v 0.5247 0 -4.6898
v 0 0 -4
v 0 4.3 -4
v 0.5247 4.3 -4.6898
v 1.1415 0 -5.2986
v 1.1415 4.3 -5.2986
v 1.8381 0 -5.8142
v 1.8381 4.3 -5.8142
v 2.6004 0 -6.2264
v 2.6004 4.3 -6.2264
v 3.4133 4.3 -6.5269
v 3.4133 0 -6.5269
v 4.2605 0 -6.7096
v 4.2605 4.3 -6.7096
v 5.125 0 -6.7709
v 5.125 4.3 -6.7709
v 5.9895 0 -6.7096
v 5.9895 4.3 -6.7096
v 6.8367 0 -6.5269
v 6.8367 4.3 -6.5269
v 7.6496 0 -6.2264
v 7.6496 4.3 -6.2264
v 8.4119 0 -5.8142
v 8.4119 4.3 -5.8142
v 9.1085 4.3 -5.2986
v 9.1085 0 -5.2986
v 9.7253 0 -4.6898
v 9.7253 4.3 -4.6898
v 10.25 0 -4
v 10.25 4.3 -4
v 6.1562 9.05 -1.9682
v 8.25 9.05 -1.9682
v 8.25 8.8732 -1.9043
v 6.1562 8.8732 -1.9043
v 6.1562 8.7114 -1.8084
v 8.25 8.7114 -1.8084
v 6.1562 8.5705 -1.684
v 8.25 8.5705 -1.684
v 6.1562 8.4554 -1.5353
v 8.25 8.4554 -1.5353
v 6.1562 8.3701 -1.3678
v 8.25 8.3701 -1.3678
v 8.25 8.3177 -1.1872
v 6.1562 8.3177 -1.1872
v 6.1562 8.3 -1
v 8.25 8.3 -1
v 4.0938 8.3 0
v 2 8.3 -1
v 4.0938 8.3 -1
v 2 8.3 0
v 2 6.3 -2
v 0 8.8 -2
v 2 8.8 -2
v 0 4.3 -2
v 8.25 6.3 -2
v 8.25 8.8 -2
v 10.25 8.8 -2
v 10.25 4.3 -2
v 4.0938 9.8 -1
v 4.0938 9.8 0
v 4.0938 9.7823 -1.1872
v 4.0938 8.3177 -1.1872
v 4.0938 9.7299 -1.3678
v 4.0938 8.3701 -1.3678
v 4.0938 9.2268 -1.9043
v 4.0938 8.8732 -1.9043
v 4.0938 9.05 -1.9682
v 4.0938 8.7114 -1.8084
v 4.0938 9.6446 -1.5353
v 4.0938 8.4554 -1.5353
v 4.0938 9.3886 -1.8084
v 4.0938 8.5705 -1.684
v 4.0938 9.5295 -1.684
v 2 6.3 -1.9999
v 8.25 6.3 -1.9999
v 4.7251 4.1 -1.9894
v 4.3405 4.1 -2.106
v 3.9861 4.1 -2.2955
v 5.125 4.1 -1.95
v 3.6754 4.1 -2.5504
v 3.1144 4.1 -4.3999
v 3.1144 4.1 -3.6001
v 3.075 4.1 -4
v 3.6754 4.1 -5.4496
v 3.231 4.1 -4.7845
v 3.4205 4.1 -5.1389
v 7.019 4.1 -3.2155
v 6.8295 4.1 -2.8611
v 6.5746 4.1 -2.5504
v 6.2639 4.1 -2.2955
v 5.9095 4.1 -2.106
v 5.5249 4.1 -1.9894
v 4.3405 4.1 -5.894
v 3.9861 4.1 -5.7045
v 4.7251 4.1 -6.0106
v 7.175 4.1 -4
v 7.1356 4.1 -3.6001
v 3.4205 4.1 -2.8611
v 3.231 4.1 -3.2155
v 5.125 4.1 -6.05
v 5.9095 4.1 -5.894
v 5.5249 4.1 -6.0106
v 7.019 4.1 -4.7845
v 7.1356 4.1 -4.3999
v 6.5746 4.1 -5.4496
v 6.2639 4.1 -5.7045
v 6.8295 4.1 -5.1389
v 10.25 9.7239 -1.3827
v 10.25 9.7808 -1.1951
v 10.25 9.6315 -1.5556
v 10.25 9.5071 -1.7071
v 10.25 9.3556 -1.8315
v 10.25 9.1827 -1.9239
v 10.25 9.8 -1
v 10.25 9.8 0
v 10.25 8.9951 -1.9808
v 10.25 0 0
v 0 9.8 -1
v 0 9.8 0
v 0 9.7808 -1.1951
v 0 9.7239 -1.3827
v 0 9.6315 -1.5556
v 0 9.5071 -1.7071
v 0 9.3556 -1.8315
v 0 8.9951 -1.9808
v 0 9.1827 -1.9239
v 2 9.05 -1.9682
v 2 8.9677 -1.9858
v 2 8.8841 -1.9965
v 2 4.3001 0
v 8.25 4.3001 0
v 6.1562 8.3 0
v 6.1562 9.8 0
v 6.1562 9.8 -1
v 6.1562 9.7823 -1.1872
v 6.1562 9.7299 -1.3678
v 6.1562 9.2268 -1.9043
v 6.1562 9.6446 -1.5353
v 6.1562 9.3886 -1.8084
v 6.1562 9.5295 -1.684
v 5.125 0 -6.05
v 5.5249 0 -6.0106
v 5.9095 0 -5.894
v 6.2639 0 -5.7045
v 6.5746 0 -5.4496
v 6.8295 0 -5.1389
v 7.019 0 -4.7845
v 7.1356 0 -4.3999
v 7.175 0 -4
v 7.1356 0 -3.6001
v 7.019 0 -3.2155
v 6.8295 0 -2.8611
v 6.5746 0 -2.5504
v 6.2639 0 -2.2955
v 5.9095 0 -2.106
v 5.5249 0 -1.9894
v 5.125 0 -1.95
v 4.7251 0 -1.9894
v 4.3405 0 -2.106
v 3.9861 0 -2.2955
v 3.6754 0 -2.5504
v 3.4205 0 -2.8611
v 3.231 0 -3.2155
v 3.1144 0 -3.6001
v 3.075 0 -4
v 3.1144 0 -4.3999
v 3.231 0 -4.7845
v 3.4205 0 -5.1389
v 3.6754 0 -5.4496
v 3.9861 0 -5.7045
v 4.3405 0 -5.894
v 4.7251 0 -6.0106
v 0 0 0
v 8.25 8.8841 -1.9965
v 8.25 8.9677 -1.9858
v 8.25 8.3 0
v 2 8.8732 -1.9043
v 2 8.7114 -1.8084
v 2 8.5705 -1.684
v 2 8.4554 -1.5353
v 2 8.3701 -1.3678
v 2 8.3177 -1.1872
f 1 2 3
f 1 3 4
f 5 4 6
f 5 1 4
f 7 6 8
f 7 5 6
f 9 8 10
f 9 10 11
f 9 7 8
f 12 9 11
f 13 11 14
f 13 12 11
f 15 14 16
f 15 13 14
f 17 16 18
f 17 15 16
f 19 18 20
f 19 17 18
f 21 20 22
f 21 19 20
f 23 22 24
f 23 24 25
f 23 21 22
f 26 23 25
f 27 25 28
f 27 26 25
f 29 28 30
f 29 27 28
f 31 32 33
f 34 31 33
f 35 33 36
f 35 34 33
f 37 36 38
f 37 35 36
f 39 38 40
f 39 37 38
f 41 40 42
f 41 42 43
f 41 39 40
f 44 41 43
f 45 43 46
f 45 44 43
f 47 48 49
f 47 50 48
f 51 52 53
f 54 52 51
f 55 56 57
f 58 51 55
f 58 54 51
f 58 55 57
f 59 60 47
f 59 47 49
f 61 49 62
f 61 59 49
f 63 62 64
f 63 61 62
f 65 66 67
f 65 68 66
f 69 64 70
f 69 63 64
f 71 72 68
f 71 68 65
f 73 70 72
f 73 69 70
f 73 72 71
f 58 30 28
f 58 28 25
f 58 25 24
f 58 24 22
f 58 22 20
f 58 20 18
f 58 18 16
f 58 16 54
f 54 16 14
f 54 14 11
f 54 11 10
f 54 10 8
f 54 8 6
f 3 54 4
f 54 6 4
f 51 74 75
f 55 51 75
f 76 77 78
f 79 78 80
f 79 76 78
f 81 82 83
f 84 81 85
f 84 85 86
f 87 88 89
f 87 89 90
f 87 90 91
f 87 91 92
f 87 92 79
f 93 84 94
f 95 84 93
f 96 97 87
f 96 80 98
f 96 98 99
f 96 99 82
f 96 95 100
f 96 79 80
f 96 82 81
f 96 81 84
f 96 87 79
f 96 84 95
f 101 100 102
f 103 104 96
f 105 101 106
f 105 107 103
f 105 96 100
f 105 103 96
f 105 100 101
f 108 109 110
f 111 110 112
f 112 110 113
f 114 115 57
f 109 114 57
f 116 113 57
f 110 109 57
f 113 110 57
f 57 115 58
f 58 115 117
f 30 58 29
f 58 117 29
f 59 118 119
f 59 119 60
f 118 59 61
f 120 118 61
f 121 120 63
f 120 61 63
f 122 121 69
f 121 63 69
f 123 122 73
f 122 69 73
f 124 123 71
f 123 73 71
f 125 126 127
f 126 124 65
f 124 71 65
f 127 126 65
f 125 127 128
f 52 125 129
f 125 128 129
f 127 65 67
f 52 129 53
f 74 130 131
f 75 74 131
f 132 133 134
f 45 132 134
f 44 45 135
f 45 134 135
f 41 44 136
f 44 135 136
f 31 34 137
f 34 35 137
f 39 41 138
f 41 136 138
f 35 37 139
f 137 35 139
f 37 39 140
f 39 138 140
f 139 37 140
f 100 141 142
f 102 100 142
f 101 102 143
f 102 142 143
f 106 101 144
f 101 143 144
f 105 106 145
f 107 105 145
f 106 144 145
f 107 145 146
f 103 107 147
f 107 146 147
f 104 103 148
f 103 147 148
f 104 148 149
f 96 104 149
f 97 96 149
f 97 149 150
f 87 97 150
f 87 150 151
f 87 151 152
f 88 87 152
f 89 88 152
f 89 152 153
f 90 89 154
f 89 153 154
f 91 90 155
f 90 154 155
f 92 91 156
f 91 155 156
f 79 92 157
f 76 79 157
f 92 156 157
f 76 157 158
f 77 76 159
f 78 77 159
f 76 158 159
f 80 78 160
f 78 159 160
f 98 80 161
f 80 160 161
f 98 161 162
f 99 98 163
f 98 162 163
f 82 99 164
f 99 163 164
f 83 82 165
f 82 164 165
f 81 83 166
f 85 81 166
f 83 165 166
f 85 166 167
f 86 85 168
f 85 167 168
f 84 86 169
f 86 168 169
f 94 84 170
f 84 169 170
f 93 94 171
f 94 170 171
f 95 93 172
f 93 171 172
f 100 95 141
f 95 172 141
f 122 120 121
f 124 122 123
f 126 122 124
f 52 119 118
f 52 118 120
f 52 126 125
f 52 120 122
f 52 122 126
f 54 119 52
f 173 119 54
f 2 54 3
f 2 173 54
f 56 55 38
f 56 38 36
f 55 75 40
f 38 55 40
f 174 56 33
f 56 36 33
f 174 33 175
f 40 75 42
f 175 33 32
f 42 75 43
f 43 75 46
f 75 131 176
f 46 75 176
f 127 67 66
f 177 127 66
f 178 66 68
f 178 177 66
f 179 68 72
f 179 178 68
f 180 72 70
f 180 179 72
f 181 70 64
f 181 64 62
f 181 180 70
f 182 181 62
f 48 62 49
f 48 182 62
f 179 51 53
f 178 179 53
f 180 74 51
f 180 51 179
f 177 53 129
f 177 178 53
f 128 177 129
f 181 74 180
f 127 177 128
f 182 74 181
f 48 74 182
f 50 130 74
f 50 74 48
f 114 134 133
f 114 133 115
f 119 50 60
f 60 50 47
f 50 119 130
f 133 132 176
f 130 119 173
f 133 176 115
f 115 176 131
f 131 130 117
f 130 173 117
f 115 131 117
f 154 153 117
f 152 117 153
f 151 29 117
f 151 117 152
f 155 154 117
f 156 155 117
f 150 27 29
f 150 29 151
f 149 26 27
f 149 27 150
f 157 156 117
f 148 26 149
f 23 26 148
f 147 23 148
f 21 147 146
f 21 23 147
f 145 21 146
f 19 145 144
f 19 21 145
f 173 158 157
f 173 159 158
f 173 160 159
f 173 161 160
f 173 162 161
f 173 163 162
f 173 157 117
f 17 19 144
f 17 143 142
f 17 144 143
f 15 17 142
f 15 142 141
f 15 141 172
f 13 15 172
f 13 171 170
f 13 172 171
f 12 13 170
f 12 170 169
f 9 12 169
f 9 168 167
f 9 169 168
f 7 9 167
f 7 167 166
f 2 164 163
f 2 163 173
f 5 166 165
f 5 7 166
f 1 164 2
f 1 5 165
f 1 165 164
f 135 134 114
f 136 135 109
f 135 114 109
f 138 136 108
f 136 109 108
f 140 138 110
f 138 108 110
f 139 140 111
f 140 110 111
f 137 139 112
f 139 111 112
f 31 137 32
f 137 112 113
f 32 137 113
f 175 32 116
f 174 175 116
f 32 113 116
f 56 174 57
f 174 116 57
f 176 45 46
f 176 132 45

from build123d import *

# Parameters (mm, degrees)
PROFILEBOSS_EXTRUDE1_DEPTH    = 4.3
ANGLESKETCH7_W                = 10.25
ANGLESKETCH7_H                = 2
ANGLEBOSS_EXTRUDE3_DEPTH      = 5.5
UNDERROLLERSKETCH10_W         = 6.25
UNDERROLLERSKETCH10_H         = 2
UNDERROLLERCUT_EXTRUDE5_DEPTH = 16.714565224
UNDERFILLET22_R               = 1
OPENNINGCUT_EXTRUDE1_REACH    = 17.715
SKETCH2_W                     = 2.0625
SKETCH2_H                     = 2
OUTCHAMFER1_SIZE              = 2
TOPFILLET1_R                  = 1
CLAMPMOUNTHOLESKETCH3_R       = 2.05
CUT_EXTRUDE1_DEPTH            = 4.1


with BuildPart() as part:
    # Sketch1 → ProfileBoss-Extrude1 (new body)
    with BuildSketch(Plane(origin=(0, 0, 0), x_dir=(1, 0, 0), z_dir=(0, 1, 0))):
        with BuildLine():
            Line((10.25, 4), (10.25, 0))
            Line((10.25, 0), (0, 0))
            Line((0, 0), (0, 4))
            ThreePointArc((0, 4), (5.125, 6.770898034), (10.25, 4))
        make_face()
    extrude(amount=PROFILEBOSS_EXTRUDE1_DEPTH)

    # AngleSketch7 → AngleBoss-Extrude3 (add)
    with BuildSketch(Plane(origin=(0, 4.3, 0), x_dir=(1, 0, 0), z_dir=(0, 1, 0))):
        with Locations((5.125, 1)):
            Rectangle(ANGLESKETCH7_W, ANGLESKETCH7_H)
    extrude(amount=ANGLEBOSS_EXTRUDE3_DEPTH)

    # UnderRollerSketch10 → UnderRollerCut-Extrude5 (cut, through all)
    with BuildSketch(Plane.XY):
        with Locations((5.125, 7.3)):
            Rectangle(UNDERROLLERSKETCH10_W, UNDERROLLERSKETCH10_H)
    extrude(amount=-UNDERROLLERCUT_EXTRUDE5_DEPTH, mode=Mode.SUBTRACT)

    # UnderFillet22
    underfillet22_edges = [part.edges().sort_by_distance(p)[0] for p in [
        (5.125, 8.3, -2),
    ]]
    fillet(underfillet22_edges, radius=UNDERFILLET22_R)

    # Sketch2 → OpenningCut-Extrude1 (cut, up to next)
    with BuildSketch(Plane(origin=(0, 9.8, 0), x_dir=(1, 0, 0), z_dir=(0, 1, 0)), mode=Mode.PRIVATE) as openningcut_extrude1_sk1:
        with Locations((5.125, 1)):
            Rectangle(SKETCH2_W, SKETCH2_H)
    openningcut_extrude1_tool1 = extrude(openningcut_extrude1_sk1.sketch, amount=-OPENNINGCUT_EXTRUDE1_REACH, mode=Mode.PRIVATE) & part.part
    add(openningcut_extrude1_tool1.solids().sort_by_distance((5.125, 9.8, -1))[0], mode=Mode.SUBTRACT)

    # OutChamfer1
    outchamfer1_edges = [part.edges().sort_by_distance(p)[0] for p in [
        (5.125, 6.3, 0),
    ]]
    chamfer(outchamfer1_edges, length=OUTCHAMFER1_SIZE - 0.0001)  # a hair under: the kernel refuses the full size

    # TopFillet1
    topfillet1_edges = [part.edges().sort_by_distance(p)[0] for p in [
        (8.203125, 9.8, -2),
        (2.046875, 9.8, -2),
    ]]
    fillet(topfillet1_edges, radius=TOPFILLET1_R)

    # ClampMountHoleSketch3 → Cut-Extrude1 (cut)
    with BuildSketch(Plane.XZ):
        with Locations(Location((5.125, -4, 0), (0, 0, 270))):
            Circle(CLAMPMOUNTHOLESKETCH3_R)
    extrude(amount=-CUT_EXTRUDE1_DEPTH, mode=Mode.SUBTRACT)


solid = part.part
